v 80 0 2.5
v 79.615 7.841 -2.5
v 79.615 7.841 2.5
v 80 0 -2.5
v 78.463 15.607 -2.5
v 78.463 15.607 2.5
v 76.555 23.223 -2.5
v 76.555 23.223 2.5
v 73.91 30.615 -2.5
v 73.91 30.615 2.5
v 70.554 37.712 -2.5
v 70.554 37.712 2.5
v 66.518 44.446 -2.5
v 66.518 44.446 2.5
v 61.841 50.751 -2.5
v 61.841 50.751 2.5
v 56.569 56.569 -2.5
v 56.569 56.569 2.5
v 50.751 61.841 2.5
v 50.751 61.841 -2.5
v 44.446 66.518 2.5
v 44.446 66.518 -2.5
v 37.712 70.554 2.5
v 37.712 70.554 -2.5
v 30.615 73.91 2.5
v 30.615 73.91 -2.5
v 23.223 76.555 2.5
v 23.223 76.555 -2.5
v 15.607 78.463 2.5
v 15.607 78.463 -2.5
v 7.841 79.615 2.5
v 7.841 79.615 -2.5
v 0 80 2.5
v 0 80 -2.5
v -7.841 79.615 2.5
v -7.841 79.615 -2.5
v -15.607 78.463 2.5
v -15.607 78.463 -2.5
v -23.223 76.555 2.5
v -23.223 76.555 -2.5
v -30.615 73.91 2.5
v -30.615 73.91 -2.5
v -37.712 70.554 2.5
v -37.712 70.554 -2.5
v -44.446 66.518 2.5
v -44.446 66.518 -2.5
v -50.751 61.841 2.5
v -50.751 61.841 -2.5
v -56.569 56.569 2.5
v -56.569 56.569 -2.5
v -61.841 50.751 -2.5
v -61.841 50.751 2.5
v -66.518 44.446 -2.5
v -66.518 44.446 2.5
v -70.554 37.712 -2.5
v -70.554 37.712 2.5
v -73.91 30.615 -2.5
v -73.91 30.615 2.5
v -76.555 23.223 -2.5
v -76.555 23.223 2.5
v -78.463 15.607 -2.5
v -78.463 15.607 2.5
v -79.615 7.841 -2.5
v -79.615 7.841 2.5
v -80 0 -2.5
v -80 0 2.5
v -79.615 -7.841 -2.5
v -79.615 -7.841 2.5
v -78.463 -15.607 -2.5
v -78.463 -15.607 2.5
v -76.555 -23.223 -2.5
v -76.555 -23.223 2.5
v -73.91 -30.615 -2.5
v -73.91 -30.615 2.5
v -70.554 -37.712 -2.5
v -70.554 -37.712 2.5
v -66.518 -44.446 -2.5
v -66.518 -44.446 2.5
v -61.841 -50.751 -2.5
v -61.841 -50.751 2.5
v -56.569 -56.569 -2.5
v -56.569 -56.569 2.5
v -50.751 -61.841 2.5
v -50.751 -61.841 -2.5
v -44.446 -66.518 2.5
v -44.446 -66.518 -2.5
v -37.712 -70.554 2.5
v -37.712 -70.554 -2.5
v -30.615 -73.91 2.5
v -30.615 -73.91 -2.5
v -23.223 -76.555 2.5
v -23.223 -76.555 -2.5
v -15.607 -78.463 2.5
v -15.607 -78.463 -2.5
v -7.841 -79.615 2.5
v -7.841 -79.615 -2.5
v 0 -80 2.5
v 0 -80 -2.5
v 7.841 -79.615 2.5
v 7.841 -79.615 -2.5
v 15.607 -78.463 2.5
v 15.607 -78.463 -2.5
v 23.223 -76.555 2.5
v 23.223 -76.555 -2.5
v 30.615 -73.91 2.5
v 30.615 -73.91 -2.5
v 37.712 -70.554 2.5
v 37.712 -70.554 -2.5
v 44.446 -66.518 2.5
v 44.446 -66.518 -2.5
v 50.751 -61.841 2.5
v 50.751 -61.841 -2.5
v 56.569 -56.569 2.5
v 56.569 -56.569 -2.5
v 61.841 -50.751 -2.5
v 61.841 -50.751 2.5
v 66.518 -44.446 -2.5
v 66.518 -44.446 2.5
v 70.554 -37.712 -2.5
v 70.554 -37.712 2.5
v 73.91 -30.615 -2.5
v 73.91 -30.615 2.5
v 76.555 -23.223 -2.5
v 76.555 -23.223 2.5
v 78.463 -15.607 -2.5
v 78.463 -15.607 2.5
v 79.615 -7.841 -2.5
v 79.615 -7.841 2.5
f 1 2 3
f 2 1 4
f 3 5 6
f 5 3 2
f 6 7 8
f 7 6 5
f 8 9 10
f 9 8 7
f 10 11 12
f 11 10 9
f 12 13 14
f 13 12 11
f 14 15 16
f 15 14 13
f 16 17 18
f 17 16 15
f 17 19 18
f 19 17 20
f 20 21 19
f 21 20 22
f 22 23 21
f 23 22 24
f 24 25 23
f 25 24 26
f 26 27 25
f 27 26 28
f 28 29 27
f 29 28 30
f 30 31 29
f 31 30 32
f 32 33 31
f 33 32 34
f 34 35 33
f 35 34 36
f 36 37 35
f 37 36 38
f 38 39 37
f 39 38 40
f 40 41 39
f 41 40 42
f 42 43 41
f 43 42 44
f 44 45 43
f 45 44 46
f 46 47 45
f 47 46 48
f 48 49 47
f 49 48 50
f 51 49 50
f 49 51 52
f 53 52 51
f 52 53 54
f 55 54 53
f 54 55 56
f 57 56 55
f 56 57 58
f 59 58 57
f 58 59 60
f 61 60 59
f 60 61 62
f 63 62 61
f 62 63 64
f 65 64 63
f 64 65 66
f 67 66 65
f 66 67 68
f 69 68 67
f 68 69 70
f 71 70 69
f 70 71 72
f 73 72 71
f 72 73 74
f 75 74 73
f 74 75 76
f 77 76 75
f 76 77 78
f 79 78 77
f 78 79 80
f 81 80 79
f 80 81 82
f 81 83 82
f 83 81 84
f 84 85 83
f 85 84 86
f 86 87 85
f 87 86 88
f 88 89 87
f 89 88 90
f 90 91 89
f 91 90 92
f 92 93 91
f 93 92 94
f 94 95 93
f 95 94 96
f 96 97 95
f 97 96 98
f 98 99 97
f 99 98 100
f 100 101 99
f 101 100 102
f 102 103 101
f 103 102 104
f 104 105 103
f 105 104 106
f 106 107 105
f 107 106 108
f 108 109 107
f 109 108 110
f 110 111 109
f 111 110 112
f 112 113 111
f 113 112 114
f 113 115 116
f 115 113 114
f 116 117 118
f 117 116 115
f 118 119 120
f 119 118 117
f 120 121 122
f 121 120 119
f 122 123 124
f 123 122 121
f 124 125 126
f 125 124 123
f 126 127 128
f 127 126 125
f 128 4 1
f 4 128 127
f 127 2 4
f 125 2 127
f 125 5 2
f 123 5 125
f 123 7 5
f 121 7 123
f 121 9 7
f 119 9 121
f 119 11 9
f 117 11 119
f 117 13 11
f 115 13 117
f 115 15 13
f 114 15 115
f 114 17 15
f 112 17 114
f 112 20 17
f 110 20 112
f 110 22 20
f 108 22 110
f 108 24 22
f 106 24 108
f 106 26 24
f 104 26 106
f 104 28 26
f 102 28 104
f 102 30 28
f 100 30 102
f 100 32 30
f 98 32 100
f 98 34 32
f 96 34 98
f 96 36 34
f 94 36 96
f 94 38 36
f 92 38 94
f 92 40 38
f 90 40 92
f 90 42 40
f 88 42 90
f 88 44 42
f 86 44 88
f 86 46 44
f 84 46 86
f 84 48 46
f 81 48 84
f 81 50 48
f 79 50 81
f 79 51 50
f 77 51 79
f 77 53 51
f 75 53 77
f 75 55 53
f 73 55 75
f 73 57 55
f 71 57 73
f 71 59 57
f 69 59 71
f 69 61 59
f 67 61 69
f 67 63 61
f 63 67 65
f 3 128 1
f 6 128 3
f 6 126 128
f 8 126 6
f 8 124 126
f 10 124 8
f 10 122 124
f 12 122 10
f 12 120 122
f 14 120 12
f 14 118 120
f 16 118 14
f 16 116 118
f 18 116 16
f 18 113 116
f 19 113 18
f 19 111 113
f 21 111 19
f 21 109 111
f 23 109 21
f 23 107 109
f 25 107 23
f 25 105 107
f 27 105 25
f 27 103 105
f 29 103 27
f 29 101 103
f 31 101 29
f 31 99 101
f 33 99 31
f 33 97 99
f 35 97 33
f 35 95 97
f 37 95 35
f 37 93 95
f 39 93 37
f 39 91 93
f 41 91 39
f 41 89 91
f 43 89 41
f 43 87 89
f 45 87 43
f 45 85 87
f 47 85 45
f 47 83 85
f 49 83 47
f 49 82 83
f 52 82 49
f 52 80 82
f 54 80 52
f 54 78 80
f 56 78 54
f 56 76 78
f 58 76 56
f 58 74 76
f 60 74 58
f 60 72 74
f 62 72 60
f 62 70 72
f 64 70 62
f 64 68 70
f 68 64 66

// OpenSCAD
module BrakeDisc()
{
  /* TODO */
  $fn = 64;
  cylinder(d=160, h=5, center=true);
}

BrakeDisc();
